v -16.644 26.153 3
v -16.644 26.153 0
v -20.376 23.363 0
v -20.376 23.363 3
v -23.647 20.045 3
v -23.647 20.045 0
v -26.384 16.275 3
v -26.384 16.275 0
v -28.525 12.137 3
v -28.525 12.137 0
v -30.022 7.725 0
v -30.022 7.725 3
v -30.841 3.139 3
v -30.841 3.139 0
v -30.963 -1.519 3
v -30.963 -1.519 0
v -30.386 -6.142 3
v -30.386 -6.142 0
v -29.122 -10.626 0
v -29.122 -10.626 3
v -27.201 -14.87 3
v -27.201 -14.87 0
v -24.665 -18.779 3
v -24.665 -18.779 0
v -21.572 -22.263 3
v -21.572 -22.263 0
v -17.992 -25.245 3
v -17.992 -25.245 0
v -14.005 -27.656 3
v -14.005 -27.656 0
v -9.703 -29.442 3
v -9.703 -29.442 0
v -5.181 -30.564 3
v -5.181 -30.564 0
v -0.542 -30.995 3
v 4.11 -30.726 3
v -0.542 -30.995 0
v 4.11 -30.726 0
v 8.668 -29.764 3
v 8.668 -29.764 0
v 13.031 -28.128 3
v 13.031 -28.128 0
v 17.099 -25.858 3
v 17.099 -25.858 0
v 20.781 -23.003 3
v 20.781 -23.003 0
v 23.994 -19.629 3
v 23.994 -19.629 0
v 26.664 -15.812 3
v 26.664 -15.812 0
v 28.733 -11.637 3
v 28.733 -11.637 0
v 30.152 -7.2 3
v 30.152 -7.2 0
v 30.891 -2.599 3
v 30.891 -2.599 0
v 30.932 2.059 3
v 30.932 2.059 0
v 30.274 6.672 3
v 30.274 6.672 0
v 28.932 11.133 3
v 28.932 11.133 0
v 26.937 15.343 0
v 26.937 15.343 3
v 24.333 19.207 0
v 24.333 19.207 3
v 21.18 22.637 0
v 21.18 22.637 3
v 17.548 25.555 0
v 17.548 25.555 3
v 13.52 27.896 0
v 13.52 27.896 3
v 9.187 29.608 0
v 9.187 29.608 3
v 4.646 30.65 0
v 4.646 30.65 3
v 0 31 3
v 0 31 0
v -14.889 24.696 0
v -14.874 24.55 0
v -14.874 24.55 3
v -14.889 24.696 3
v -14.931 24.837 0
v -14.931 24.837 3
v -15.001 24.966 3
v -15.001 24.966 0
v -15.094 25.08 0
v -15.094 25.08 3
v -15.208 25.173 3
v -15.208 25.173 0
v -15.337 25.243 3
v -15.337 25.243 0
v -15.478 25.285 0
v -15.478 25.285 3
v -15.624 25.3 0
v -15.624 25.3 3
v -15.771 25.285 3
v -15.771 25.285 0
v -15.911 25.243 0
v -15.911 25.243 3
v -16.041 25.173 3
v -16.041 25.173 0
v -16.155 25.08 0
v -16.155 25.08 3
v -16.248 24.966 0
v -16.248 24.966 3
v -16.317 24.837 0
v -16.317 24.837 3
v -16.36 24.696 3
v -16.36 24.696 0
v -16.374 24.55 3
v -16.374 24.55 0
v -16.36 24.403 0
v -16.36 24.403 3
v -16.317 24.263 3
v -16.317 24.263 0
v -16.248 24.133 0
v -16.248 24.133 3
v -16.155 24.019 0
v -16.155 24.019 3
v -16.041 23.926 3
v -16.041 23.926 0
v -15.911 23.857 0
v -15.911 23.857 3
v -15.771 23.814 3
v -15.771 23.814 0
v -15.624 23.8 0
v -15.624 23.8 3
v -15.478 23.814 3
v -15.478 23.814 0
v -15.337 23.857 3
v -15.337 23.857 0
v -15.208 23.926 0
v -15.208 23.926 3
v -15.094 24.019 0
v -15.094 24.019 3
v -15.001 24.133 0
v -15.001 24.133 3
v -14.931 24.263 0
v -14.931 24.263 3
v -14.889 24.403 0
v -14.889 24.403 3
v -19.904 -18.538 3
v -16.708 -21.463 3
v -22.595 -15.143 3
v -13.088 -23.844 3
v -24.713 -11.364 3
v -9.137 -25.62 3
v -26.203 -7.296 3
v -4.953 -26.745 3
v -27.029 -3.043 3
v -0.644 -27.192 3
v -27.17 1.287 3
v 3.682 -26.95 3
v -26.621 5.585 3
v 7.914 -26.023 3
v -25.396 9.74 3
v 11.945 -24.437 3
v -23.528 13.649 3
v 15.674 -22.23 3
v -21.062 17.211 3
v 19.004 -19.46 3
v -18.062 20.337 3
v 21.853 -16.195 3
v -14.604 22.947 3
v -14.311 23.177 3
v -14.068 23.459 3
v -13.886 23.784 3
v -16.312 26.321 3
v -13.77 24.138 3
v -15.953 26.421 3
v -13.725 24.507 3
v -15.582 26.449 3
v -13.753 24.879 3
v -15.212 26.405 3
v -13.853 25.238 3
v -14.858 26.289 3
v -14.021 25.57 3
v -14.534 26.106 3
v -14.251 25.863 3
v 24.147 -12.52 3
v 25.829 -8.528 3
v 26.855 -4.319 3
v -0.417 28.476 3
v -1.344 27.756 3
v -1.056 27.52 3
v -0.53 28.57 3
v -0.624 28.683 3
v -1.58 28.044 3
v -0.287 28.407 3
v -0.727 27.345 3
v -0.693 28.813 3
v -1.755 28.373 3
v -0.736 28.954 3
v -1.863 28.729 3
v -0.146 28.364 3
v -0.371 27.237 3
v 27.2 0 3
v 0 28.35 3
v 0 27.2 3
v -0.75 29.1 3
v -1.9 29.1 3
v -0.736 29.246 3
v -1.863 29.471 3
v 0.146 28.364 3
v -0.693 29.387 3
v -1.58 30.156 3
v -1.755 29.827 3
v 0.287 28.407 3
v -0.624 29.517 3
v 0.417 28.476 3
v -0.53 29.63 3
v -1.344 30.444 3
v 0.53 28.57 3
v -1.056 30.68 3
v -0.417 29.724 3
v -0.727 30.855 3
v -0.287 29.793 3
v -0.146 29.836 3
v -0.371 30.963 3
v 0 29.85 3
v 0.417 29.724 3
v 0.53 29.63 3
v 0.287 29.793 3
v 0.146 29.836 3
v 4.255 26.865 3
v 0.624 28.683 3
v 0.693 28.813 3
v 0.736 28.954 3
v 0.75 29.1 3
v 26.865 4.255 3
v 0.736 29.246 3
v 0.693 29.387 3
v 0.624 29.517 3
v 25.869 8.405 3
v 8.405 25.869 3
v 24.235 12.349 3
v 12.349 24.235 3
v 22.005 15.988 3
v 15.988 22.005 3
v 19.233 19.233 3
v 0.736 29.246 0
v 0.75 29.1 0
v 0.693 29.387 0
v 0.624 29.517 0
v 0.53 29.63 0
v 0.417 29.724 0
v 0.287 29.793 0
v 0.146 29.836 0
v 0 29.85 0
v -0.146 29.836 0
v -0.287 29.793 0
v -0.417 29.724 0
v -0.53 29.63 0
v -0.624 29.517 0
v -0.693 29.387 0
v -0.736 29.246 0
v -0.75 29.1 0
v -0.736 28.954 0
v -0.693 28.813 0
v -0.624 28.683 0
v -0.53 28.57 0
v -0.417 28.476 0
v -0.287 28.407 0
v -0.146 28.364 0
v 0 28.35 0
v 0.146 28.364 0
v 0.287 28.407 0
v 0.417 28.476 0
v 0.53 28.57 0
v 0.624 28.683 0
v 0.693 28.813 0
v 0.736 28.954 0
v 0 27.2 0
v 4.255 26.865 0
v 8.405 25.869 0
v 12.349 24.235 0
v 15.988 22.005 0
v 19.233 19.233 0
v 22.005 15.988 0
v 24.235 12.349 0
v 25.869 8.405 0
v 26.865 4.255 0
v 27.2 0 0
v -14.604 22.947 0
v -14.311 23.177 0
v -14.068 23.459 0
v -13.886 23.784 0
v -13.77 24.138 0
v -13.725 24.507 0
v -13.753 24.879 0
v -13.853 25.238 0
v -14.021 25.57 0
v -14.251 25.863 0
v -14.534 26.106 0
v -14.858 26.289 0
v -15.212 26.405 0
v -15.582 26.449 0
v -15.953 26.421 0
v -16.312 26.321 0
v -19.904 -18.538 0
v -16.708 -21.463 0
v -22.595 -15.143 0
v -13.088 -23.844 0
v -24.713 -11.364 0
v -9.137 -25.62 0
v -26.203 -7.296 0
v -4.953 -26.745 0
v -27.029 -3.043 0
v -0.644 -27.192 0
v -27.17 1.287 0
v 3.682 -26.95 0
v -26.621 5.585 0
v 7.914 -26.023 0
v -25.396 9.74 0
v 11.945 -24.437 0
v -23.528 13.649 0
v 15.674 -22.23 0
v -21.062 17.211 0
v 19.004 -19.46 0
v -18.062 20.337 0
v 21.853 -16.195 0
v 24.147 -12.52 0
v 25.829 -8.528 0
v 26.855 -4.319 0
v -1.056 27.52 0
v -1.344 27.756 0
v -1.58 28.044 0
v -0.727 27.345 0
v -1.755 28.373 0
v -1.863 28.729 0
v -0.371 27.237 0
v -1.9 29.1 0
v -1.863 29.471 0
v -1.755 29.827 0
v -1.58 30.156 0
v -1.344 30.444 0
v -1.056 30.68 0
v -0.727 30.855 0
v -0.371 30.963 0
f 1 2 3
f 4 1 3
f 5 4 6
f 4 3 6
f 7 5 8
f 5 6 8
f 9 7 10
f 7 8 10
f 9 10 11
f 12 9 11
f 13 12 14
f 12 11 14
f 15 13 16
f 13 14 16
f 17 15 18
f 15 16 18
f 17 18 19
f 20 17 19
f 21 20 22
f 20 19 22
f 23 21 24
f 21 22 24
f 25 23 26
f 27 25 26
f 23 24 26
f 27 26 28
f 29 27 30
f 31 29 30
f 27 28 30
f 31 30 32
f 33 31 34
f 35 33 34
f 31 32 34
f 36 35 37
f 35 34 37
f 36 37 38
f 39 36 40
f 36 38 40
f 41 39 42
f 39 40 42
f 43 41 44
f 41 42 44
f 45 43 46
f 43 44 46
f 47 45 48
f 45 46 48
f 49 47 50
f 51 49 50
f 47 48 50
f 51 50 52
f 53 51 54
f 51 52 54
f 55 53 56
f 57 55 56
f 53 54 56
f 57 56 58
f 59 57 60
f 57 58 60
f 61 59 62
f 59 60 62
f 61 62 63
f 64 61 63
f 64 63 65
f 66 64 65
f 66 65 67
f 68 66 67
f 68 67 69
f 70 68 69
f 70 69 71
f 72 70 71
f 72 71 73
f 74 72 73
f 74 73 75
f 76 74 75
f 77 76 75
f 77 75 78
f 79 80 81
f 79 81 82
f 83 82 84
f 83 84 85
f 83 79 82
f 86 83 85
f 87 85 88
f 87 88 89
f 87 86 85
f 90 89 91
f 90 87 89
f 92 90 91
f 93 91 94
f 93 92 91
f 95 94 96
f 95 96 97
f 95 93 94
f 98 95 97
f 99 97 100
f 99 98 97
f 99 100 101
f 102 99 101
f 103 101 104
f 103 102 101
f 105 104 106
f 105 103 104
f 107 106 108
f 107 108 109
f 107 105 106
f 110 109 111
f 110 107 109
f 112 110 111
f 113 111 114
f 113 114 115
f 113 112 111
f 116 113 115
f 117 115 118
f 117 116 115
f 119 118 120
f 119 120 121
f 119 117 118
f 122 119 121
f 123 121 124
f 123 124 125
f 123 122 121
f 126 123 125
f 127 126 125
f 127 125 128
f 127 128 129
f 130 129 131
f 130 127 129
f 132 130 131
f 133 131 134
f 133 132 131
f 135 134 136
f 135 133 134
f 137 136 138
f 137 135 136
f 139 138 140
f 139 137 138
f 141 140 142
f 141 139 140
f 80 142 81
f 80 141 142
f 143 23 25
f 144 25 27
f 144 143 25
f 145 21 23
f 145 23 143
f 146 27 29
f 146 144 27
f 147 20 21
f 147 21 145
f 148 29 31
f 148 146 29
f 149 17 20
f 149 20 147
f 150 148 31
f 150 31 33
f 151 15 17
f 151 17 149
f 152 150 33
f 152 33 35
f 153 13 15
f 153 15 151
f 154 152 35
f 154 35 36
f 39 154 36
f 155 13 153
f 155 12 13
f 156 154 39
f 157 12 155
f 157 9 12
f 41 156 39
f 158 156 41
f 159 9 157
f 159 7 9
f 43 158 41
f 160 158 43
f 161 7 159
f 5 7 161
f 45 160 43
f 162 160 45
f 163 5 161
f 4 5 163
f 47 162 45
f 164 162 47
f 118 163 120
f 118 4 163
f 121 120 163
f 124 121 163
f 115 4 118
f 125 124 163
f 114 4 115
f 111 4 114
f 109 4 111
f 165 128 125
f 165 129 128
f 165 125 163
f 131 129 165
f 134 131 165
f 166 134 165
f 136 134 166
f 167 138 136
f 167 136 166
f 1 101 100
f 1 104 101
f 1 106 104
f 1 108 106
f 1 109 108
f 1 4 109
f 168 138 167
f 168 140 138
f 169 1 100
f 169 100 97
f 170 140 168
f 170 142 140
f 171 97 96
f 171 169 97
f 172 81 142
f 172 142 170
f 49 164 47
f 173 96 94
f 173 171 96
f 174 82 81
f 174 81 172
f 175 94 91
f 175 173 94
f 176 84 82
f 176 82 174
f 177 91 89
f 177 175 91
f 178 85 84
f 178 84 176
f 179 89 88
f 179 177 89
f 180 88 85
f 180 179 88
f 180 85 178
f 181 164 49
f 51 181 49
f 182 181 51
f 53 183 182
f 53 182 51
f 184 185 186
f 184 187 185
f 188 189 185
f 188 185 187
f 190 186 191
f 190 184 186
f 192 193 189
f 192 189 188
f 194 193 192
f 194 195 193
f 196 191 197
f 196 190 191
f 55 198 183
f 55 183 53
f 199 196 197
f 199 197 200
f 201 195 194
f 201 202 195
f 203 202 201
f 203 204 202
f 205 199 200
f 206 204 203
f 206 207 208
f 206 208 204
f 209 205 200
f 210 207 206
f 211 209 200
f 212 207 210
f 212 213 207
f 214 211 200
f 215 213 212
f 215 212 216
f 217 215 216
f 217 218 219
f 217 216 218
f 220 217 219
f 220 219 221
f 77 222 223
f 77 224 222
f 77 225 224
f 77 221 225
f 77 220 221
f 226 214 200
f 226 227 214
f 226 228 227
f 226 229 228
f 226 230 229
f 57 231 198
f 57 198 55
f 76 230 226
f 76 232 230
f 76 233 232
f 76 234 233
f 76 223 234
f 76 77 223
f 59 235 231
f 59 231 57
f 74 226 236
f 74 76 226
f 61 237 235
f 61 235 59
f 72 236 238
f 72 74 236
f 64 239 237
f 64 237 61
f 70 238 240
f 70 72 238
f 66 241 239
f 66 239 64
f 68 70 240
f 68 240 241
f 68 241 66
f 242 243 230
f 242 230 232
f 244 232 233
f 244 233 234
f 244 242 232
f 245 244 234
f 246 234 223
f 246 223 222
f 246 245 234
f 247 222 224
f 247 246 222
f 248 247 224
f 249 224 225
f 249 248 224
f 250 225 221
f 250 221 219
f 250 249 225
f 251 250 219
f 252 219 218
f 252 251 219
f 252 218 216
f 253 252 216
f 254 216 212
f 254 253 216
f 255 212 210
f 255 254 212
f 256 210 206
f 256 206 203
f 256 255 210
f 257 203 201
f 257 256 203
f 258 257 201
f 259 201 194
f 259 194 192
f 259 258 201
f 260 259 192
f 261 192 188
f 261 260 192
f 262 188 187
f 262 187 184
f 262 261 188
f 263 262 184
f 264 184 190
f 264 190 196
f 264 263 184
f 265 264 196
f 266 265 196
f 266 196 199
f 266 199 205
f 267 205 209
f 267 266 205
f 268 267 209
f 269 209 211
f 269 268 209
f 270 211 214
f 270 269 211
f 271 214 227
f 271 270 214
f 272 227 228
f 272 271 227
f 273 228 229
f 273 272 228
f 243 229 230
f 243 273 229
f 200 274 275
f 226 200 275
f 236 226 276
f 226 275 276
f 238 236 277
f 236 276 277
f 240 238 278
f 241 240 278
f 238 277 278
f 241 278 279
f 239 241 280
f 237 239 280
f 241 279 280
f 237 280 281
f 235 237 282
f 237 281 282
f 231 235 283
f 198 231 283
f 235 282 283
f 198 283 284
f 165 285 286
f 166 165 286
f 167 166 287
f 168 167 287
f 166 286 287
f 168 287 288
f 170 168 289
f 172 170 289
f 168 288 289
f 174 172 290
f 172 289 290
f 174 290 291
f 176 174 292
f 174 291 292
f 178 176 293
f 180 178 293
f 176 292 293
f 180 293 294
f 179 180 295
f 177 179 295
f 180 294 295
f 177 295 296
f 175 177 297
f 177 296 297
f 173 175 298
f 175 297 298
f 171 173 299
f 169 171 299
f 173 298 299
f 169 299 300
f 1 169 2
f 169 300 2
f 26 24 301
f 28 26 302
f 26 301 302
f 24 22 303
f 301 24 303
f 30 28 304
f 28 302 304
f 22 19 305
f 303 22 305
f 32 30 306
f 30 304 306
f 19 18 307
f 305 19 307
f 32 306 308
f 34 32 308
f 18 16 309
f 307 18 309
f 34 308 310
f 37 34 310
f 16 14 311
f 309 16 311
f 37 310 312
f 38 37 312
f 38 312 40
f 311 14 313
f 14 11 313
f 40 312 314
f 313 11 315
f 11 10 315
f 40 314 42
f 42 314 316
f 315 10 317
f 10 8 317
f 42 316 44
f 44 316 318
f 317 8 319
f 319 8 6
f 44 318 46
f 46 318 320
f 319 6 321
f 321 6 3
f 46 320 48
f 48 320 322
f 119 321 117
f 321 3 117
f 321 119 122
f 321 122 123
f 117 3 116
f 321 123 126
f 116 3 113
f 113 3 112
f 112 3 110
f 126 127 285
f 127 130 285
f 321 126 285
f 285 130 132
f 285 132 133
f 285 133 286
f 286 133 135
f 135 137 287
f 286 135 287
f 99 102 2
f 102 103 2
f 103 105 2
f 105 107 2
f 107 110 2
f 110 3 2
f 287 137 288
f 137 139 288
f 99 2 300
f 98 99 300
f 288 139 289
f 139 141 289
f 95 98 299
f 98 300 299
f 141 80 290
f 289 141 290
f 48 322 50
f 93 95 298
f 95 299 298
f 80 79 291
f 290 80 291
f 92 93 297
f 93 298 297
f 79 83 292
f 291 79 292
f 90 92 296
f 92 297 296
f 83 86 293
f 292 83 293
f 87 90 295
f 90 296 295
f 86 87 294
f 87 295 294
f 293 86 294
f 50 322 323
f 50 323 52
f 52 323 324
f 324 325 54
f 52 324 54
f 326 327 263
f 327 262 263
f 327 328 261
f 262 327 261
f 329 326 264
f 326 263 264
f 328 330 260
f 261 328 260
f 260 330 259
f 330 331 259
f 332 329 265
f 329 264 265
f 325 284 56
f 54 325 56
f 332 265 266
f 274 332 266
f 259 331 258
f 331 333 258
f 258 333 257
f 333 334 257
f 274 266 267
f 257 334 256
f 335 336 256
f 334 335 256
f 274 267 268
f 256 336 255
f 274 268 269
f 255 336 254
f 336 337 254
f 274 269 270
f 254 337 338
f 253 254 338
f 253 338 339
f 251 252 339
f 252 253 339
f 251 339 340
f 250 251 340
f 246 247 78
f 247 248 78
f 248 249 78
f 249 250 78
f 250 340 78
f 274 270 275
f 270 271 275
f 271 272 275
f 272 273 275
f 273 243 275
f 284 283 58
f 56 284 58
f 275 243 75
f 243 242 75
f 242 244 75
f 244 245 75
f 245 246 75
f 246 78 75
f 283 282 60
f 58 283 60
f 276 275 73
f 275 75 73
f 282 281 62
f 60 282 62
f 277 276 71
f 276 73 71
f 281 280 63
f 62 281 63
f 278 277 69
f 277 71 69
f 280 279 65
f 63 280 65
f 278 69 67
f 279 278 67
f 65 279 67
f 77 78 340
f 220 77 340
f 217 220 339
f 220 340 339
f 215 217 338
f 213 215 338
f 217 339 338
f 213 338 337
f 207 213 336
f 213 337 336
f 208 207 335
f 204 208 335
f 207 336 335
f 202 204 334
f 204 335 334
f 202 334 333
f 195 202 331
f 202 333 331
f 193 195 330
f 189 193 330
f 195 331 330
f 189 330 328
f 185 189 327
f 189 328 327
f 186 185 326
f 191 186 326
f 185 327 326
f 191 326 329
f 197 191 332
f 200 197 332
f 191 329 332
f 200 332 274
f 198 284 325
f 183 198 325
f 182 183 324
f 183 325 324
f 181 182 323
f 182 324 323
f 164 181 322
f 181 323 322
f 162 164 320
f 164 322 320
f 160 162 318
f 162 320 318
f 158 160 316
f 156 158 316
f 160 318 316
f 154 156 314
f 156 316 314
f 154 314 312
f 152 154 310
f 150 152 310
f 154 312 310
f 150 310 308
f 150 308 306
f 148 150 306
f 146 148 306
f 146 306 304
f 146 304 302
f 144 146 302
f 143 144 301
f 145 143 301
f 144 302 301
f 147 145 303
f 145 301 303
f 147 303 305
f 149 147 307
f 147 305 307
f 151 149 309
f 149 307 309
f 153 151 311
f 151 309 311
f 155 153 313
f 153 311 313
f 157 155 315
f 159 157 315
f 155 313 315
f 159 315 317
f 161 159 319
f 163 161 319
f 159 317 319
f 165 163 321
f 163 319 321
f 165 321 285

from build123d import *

# Parameters (mm, degrees)
SKETCH1_R           = 0.75
BOSS_EXTRUDE1_DEPTH = 3


with BuildPart() as part:
    # Sketch1 → Boss-Extrude1 (new body)
    with BuildSketch(Plane.XY):
        with BuildLine():
            ThreePointArc((0, 27.2), (19.233304448, 19.233304448), (27.2, 0))
            ThreePointArc((27.2, 0), (-13.088306987, -23.843997572), (-14.60413384, 22.946879413))
            ThreePointArc((-14.60413384, 22.946879413), (-14.021368524, 25.569928133), (-16.644417244, 26.152693449))
            ThreePointArc((-16.644417244, 26.152693449), (8.667943905, -29.763513711), (0, 31))
            ThreePointArc((0, 31), (-1.9, 29.1), (0, 27.2))
        make_face()
        with Locations((-15.624275542, 24.549786431)):
            Circle(SKETCH1_R, mode=Mode.SUBTRACT)
        with Locations((0, 29.1)):
            Circle(SKETCH1_R, mode=Mode.SUBTRACT)
    extrude(amount=BOSS_EXTRUDE1_DEPTH)


solid = part.part
